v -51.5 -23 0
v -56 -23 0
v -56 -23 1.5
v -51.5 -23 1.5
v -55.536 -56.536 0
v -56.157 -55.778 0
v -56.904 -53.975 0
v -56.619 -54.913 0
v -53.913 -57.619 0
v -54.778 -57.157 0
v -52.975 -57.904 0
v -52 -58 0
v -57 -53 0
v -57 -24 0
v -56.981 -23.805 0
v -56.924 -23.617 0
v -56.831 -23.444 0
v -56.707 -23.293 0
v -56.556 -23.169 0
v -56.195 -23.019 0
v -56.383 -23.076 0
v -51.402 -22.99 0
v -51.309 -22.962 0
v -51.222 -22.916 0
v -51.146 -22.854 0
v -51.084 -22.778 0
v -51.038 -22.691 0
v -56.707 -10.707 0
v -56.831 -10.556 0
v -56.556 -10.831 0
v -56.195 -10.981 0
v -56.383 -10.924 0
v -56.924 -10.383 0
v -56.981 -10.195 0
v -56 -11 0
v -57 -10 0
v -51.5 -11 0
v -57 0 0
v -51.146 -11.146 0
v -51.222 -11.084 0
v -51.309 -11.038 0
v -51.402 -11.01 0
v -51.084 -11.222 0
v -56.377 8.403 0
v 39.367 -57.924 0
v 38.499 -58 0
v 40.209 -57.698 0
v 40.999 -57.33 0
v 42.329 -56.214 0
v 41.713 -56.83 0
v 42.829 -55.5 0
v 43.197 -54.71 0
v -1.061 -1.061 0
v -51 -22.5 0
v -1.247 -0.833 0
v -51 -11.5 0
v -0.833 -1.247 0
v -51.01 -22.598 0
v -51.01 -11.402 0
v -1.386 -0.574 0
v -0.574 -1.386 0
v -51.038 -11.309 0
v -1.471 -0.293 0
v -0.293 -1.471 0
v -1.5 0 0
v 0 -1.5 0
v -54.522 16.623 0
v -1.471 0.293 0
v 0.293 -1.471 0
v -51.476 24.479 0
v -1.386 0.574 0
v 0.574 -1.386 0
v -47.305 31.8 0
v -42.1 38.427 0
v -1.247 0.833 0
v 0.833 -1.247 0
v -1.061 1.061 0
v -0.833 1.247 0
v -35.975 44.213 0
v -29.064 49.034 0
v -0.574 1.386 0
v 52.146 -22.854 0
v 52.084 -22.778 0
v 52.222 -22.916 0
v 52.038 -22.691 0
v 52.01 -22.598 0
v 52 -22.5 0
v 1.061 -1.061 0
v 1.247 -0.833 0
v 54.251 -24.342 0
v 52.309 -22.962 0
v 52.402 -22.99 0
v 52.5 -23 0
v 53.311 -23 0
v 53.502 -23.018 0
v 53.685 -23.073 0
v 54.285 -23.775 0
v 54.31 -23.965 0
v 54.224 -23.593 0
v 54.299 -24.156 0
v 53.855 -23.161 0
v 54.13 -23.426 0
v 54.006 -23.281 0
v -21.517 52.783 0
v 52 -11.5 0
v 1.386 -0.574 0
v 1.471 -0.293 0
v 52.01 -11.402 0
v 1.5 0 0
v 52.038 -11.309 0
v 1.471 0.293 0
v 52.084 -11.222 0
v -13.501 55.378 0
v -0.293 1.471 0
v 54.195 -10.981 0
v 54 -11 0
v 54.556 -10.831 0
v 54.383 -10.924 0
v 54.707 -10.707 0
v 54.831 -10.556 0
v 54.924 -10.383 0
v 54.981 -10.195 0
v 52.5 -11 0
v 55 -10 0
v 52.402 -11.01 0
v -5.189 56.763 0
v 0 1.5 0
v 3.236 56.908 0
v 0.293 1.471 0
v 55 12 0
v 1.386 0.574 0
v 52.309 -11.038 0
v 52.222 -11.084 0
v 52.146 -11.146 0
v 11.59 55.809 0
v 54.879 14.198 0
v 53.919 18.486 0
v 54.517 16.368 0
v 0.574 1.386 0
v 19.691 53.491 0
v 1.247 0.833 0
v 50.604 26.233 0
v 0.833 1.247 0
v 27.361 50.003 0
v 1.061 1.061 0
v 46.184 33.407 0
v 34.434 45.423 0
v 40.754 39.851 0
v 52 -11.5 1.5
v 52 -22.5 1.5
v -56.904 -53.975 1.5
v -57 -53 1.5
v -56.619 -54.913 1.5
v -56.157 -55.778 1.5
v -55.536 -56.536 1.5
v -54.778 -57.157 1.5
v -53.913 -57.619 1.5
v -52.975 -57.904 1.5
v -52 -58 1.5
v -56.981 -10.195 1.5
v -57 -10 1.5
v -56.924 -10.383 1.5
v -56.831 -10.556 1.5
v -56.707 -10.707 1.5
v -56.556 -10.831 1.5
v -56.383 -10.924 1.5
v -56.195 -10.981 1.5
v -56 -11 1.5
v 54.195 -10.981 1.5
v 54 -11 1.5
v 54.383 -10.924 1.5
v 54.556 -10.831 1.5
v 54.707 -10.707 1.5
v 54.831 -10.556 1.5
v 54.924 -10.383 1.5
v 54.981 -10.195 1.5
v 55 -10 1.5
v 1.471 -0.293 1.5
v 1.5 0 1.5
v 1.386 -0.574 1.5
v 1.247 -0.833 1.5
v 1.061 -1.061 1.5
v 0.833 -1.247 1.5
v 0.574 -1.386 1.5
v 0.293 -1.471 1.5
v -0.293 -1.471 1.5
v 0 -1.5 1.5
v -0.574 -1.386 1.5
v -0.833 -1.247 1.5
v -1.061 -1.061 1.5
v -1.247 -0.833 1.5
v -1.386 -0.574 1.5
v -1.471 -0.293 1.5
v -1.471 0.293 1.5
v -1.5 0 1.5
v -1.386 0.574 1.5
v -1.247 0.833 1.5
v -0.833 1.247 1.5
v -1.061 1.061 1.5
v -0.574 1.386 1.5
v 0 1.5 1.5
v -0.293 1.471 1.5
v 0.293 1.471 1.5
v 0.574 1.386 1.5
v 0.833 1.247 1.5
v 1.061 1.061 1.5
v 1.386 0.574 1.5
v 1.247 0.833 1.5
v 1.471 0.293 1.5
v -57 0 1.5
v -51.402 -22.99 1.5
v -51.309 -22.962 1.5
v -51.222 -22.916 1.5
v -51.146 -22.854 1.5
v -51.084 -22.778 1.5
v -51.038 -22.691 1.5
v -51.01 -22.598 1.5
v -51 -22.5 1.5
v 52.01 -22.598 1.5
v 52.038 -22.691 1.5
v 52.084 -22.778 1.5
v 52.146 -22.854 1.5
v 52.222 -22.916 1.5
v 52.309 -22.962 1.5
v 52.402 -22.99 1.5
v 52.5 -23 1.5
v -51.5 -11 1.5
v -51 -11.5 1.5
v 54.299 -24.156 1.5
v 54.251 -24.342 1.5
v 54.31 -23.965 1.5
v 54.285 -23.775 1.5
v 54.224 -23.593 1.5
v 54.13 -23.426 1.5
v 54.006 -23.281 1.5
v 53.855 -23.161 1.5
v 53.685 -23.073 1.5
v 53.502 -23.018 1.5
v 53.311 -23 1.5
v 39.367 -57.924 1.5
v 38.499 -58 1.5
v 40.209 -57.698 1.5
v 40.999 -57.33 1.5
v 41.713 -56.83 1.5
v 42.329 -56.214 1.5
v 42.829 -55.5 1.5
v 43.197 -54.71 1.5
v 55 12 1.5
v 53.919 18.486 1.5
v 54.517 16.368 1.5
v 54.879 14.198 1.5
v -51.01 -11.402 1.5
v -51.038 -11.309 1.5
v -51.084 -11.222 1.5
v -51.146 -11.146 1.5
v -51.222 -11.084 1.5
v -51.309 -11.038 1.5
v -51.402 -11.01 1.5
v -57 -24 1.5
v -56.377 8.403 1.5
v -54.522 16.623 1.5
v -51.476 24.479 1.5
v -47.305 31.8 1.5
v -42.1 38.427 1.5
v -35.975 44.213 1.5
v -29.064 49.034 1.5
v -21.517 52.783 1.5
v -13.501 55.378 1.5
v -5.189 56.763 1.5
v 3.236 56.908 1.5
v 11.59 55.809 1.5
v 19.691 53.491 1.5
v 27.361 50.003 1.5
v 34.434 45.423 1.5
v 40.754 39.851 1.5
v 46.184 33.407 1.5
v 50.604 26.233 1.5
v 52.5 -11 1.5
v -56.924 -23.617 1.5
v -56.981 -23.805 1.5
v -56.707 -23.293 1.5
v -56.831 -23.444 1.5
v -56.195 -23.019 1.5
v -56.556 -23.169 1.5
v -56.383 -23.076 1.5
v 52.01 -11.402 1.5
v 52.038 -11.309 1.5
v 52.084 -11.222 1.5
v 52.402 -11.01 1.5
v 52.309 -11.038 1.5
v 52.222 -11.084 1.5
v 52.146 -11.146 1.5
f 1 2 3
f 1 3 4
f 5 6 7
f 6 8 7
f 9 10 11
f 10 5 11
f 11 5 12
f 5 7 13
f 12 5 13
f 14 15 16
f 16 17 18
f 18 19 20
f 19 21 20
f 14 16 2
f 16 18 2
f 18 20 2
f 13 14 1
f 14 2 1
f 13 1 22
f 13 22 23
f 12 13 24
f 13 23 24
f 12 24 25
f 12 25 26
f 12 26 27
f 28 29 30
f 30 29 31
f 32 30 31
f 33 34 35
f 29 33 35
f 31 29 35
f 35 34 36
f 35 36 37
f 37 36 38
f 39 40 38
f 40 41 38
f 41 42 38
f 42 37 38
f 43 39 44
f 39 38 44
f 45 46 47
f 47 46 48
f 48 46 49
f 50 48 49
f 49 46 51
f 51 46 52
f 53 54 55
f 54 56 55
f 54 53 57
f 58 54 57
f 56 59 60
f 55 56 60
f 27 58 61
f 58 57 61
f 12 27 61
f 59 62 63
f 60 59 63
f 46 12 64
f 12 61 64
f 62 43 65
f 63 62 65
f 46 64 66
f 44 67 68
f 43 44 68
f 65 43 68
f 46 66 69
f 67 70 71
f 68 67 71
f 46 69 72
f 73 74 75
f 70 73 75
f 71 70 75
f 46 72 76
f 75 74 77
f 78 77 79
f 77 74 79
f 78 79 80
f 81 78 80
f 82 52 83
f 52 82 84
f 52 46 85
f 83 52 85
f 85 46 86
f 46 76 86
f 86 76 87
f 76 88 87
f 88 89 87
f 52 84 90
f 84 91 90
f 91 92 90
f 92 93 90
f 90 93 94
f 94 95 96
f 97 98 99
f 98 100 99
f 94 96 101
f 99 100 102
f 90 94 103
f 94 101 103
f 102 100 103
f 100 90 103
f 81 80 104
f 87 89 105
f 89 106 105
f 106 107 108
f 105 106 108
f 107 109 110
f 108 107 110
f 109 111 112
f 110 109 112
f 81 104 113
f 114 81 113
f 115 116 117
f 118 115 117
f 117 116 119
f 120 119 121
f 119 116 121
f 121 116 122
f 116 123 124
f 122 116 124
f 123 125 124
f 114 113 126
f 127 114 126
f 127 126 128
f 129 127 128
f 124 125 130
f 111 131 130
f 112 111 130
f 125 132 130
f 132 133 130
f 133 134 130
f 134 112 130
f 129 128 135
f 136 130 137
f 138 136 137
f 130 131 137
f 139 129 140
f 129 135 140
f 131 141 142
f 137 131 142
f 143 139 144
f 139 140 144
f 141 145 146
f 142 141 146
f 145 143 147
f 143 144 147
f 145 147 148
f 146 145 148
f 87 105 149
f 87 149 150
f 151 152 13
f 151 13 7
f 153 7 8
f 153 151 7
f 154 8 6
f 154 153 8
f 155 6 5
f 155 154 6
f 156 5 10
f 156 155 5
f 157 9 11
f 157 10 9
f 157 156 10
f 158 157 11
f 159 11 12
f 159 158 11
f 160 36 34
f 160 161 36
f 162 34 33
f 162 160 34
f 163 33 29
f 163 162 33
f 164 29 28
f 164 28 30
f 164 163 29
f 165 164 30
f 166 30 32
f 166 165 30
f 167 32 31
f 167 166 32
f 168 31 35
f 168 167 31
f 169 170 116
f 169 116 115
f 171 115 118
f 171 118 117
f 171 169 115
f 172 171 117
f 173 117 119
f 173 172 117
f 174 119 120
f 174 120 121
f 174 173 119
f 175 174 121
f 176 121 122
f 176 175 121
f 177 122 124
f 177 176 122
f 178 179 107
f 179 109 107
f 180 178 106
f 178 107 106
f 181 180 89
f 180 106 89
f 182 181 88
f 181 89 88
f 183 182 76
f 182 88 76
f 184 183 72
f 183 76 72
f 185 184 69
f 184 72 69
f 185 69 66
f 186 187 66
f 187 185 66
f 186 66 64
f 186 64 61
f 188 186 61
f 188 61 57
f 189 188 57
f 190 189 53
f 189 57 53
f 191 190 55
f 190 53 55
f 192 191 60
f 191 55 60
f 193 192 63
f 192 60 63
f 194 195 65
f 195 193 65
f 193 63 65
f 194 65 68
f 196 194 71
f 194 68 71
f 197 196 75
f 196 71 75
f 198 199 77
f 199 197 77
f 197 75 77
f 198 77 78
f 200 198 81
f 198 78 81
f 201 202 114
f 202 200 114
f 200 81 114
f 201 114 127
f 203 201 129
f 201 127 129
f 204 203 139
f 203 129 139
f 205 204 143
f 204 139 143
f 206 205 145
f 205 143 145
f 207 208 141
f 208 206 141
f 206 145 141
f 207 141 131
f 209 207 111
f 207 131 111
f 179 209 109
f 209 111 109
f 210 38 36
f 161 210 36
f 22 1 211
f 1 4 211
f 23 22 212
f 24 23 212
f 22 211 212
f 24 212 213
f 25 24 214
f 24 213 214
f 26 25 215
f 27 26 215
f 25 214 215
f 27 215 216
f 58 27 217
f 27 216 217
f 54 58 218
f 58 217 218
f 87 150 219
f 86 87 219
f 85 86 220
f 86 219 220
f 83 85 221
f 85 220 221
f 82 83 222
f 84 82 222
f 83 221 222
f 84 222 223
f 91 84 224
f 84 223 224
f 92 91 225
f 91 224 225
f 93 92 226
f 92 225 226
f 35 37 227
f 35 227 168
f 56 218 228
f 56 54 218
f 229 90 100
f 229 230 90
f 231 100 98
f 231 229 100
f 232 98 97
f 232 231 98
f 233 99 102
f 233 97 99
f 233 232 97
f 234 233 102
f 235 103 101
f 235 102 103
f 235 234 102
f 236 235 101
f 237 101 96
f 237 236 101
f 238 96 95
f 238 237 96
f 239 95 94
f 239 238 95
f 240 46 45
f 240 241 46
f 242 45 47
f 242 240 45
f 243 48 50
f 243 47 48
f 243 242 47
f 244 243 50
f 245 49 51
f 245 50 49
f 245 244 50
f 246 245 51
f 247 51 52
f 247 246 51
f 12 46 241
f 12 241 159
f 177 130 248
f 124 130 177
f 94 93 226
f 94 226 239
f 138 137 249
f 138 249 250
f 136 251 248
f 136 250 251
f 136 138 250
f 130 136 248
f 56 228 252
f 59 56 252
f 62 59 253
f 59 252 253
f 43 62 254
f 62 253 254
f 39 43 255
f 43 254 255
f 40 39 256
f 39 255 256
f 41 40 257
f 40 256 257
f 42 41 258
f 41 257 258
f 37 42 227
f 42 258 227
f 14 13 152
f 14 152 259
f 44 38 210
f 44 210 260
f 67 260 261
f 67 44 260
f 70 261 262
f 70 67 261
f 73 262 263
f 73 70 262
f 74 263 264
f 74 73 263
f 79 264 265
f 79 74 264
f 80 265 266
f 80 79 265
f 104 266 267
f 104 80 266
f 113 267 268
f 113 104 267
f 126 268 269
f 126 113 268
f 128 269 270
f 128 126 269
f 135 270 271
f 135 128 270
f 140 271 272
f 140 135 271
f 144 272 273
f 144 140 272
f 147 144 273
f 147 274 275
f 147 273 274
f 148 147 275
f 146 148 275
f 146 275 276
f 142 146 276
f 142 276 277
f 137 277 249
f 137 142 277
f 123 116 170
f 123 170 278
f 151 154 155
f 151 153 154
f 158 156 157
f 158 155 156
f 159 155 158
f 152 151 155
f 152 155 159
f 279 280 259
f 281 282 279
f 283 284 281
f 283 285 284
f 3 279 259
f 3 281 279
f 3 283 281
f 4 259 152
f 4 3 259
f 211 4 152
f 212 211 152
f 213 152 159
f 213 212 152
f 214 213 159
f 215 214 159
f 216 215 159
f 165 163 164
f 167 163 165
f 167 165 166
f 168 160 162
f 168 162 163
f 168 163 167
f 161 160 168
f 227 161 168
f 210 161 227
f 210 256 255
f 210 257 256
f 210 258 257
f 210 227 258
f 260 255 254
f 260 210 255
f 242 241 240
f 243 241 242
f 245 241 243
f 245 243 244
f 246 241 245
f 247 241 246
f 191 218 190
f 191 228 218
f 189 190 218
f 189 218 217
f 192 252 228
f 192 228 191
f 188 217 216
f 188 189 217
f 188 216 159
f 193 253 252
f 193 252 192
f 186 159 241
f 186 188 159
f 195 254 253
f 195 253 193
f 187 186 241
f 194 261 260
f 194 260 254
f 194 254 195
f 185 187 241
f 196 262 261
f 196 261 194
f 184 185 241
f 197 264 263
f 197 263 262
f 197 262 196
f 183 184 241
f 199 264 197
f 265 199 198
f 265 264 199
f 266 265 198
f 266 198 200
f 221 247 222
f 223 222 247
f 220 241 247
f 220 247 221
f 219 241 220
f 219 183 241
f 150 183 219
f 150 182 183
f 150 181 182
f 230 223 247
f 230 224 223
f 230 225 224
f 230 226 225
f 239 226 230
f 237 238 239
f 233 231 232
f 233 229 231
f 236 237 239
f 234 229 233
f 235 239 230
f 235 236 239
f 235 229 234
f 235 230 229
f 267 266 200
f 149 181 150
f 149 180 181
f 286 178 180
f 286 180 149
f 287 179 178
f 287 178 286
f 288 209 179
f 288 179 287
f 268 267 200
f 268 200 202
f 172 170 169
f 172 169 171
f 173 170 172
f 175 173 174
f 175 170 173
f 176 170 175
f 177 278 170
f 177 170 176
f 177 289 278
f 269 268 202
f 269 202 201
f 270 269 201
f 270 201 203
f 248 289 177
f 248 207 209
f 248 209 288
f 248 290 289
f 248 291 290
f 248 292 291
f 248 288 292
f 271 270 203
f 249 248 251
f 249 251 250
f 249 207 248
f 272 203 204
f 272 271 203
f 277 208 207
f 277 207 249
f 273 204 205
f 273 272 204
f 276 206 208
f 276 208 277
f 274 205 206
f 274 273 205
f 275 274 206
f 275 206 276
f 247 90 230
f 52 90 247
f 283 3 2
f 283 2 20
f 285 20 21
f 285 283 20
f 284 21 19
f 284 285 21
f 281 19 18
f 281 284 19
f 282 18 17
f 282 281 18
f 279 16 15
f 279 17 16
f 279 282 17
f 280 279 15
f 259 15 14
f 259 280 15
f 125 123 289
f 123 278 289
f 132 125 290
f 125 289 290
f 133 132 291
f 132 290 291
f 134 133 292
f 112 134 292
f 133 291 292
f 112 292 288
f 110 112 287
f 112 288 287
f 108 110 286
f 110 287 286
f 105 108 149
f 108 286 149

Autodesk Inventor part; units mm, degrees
ref_plane "YZ Plane" through (0, 0, 0) normal (1, 0, 0) x (0, 1, 0)
ref_plane "XZ Plane" through (0, 0, 0) normal (0, 1, 0) x (-1, 0, 0)
ref_plane "XY Plane" through (0, 0, 0) normal (0, 0, 1) x (1, 0, 0)
sketch "Sketch1" plane through (0, 0, 0) normal (0, 0, 1) x (1, 0, 0)
  circle A0 centre (0, 0) radius 1.5
  arc A1 (53.9189, 18.4865) -> (-57, 0) centre (0, 0) ccw
  arc A2 (55, 12) -> (53.9189, 18.4865) centre (35, 12) ccw
  line L0 (55, 12) -> (55, -11)
  line L1 (55, -11) -> (52, -11)
  line L2 (52, -11) -> (52, -23)
  line L3 (52, -23) -> (54.739, -23)
  line L4 (54.739, -23) -> (42, -58)
  line L5 (42, -58) -> (-57, -58)
  line L6 (-57, -58) -> (-57, -23)
  line L7 (-57, -23) -> (-51, -23)
  line L8 (-51, -23) -> (-51, -11)
  line L9 (-51, -11) -> (-57, -11)
  line L10 (-57, 0) -> (-57, -11)
  dimension "d0" = 3
  dimension "d1" = 57
  dimension "d2" = 20
  dimension "d3" = 6
  dimension "d4" = 12
  dimension "d5" = 55
  dimension "d6" = 3
  dimension "d7" = 110
  dimension "d8" = 99
  dimension "d9" = 47
  dimension "d10" = 58
extrude "Extrusion1" add sketch "Sketch1" along normal blind 1.5
fillet "Fillet1" radius 0.5 4 edges at (52, -11, 0.75) (52, -23, 0.75) (-51, -11, 0.75) (-51, -23, 0.75)
fillet "Fillet2" radius 1 4 edges at (-57, -11, 0.75) (-57, -23, 0.75) (54.739, -23, 0.75) (55, -11, 0.75)
fillet "Fillet3" radius 5 2 edges at (42, -58, 0.75) (-57, -58, 0.75)
properties part number "PT Flange Outer"
